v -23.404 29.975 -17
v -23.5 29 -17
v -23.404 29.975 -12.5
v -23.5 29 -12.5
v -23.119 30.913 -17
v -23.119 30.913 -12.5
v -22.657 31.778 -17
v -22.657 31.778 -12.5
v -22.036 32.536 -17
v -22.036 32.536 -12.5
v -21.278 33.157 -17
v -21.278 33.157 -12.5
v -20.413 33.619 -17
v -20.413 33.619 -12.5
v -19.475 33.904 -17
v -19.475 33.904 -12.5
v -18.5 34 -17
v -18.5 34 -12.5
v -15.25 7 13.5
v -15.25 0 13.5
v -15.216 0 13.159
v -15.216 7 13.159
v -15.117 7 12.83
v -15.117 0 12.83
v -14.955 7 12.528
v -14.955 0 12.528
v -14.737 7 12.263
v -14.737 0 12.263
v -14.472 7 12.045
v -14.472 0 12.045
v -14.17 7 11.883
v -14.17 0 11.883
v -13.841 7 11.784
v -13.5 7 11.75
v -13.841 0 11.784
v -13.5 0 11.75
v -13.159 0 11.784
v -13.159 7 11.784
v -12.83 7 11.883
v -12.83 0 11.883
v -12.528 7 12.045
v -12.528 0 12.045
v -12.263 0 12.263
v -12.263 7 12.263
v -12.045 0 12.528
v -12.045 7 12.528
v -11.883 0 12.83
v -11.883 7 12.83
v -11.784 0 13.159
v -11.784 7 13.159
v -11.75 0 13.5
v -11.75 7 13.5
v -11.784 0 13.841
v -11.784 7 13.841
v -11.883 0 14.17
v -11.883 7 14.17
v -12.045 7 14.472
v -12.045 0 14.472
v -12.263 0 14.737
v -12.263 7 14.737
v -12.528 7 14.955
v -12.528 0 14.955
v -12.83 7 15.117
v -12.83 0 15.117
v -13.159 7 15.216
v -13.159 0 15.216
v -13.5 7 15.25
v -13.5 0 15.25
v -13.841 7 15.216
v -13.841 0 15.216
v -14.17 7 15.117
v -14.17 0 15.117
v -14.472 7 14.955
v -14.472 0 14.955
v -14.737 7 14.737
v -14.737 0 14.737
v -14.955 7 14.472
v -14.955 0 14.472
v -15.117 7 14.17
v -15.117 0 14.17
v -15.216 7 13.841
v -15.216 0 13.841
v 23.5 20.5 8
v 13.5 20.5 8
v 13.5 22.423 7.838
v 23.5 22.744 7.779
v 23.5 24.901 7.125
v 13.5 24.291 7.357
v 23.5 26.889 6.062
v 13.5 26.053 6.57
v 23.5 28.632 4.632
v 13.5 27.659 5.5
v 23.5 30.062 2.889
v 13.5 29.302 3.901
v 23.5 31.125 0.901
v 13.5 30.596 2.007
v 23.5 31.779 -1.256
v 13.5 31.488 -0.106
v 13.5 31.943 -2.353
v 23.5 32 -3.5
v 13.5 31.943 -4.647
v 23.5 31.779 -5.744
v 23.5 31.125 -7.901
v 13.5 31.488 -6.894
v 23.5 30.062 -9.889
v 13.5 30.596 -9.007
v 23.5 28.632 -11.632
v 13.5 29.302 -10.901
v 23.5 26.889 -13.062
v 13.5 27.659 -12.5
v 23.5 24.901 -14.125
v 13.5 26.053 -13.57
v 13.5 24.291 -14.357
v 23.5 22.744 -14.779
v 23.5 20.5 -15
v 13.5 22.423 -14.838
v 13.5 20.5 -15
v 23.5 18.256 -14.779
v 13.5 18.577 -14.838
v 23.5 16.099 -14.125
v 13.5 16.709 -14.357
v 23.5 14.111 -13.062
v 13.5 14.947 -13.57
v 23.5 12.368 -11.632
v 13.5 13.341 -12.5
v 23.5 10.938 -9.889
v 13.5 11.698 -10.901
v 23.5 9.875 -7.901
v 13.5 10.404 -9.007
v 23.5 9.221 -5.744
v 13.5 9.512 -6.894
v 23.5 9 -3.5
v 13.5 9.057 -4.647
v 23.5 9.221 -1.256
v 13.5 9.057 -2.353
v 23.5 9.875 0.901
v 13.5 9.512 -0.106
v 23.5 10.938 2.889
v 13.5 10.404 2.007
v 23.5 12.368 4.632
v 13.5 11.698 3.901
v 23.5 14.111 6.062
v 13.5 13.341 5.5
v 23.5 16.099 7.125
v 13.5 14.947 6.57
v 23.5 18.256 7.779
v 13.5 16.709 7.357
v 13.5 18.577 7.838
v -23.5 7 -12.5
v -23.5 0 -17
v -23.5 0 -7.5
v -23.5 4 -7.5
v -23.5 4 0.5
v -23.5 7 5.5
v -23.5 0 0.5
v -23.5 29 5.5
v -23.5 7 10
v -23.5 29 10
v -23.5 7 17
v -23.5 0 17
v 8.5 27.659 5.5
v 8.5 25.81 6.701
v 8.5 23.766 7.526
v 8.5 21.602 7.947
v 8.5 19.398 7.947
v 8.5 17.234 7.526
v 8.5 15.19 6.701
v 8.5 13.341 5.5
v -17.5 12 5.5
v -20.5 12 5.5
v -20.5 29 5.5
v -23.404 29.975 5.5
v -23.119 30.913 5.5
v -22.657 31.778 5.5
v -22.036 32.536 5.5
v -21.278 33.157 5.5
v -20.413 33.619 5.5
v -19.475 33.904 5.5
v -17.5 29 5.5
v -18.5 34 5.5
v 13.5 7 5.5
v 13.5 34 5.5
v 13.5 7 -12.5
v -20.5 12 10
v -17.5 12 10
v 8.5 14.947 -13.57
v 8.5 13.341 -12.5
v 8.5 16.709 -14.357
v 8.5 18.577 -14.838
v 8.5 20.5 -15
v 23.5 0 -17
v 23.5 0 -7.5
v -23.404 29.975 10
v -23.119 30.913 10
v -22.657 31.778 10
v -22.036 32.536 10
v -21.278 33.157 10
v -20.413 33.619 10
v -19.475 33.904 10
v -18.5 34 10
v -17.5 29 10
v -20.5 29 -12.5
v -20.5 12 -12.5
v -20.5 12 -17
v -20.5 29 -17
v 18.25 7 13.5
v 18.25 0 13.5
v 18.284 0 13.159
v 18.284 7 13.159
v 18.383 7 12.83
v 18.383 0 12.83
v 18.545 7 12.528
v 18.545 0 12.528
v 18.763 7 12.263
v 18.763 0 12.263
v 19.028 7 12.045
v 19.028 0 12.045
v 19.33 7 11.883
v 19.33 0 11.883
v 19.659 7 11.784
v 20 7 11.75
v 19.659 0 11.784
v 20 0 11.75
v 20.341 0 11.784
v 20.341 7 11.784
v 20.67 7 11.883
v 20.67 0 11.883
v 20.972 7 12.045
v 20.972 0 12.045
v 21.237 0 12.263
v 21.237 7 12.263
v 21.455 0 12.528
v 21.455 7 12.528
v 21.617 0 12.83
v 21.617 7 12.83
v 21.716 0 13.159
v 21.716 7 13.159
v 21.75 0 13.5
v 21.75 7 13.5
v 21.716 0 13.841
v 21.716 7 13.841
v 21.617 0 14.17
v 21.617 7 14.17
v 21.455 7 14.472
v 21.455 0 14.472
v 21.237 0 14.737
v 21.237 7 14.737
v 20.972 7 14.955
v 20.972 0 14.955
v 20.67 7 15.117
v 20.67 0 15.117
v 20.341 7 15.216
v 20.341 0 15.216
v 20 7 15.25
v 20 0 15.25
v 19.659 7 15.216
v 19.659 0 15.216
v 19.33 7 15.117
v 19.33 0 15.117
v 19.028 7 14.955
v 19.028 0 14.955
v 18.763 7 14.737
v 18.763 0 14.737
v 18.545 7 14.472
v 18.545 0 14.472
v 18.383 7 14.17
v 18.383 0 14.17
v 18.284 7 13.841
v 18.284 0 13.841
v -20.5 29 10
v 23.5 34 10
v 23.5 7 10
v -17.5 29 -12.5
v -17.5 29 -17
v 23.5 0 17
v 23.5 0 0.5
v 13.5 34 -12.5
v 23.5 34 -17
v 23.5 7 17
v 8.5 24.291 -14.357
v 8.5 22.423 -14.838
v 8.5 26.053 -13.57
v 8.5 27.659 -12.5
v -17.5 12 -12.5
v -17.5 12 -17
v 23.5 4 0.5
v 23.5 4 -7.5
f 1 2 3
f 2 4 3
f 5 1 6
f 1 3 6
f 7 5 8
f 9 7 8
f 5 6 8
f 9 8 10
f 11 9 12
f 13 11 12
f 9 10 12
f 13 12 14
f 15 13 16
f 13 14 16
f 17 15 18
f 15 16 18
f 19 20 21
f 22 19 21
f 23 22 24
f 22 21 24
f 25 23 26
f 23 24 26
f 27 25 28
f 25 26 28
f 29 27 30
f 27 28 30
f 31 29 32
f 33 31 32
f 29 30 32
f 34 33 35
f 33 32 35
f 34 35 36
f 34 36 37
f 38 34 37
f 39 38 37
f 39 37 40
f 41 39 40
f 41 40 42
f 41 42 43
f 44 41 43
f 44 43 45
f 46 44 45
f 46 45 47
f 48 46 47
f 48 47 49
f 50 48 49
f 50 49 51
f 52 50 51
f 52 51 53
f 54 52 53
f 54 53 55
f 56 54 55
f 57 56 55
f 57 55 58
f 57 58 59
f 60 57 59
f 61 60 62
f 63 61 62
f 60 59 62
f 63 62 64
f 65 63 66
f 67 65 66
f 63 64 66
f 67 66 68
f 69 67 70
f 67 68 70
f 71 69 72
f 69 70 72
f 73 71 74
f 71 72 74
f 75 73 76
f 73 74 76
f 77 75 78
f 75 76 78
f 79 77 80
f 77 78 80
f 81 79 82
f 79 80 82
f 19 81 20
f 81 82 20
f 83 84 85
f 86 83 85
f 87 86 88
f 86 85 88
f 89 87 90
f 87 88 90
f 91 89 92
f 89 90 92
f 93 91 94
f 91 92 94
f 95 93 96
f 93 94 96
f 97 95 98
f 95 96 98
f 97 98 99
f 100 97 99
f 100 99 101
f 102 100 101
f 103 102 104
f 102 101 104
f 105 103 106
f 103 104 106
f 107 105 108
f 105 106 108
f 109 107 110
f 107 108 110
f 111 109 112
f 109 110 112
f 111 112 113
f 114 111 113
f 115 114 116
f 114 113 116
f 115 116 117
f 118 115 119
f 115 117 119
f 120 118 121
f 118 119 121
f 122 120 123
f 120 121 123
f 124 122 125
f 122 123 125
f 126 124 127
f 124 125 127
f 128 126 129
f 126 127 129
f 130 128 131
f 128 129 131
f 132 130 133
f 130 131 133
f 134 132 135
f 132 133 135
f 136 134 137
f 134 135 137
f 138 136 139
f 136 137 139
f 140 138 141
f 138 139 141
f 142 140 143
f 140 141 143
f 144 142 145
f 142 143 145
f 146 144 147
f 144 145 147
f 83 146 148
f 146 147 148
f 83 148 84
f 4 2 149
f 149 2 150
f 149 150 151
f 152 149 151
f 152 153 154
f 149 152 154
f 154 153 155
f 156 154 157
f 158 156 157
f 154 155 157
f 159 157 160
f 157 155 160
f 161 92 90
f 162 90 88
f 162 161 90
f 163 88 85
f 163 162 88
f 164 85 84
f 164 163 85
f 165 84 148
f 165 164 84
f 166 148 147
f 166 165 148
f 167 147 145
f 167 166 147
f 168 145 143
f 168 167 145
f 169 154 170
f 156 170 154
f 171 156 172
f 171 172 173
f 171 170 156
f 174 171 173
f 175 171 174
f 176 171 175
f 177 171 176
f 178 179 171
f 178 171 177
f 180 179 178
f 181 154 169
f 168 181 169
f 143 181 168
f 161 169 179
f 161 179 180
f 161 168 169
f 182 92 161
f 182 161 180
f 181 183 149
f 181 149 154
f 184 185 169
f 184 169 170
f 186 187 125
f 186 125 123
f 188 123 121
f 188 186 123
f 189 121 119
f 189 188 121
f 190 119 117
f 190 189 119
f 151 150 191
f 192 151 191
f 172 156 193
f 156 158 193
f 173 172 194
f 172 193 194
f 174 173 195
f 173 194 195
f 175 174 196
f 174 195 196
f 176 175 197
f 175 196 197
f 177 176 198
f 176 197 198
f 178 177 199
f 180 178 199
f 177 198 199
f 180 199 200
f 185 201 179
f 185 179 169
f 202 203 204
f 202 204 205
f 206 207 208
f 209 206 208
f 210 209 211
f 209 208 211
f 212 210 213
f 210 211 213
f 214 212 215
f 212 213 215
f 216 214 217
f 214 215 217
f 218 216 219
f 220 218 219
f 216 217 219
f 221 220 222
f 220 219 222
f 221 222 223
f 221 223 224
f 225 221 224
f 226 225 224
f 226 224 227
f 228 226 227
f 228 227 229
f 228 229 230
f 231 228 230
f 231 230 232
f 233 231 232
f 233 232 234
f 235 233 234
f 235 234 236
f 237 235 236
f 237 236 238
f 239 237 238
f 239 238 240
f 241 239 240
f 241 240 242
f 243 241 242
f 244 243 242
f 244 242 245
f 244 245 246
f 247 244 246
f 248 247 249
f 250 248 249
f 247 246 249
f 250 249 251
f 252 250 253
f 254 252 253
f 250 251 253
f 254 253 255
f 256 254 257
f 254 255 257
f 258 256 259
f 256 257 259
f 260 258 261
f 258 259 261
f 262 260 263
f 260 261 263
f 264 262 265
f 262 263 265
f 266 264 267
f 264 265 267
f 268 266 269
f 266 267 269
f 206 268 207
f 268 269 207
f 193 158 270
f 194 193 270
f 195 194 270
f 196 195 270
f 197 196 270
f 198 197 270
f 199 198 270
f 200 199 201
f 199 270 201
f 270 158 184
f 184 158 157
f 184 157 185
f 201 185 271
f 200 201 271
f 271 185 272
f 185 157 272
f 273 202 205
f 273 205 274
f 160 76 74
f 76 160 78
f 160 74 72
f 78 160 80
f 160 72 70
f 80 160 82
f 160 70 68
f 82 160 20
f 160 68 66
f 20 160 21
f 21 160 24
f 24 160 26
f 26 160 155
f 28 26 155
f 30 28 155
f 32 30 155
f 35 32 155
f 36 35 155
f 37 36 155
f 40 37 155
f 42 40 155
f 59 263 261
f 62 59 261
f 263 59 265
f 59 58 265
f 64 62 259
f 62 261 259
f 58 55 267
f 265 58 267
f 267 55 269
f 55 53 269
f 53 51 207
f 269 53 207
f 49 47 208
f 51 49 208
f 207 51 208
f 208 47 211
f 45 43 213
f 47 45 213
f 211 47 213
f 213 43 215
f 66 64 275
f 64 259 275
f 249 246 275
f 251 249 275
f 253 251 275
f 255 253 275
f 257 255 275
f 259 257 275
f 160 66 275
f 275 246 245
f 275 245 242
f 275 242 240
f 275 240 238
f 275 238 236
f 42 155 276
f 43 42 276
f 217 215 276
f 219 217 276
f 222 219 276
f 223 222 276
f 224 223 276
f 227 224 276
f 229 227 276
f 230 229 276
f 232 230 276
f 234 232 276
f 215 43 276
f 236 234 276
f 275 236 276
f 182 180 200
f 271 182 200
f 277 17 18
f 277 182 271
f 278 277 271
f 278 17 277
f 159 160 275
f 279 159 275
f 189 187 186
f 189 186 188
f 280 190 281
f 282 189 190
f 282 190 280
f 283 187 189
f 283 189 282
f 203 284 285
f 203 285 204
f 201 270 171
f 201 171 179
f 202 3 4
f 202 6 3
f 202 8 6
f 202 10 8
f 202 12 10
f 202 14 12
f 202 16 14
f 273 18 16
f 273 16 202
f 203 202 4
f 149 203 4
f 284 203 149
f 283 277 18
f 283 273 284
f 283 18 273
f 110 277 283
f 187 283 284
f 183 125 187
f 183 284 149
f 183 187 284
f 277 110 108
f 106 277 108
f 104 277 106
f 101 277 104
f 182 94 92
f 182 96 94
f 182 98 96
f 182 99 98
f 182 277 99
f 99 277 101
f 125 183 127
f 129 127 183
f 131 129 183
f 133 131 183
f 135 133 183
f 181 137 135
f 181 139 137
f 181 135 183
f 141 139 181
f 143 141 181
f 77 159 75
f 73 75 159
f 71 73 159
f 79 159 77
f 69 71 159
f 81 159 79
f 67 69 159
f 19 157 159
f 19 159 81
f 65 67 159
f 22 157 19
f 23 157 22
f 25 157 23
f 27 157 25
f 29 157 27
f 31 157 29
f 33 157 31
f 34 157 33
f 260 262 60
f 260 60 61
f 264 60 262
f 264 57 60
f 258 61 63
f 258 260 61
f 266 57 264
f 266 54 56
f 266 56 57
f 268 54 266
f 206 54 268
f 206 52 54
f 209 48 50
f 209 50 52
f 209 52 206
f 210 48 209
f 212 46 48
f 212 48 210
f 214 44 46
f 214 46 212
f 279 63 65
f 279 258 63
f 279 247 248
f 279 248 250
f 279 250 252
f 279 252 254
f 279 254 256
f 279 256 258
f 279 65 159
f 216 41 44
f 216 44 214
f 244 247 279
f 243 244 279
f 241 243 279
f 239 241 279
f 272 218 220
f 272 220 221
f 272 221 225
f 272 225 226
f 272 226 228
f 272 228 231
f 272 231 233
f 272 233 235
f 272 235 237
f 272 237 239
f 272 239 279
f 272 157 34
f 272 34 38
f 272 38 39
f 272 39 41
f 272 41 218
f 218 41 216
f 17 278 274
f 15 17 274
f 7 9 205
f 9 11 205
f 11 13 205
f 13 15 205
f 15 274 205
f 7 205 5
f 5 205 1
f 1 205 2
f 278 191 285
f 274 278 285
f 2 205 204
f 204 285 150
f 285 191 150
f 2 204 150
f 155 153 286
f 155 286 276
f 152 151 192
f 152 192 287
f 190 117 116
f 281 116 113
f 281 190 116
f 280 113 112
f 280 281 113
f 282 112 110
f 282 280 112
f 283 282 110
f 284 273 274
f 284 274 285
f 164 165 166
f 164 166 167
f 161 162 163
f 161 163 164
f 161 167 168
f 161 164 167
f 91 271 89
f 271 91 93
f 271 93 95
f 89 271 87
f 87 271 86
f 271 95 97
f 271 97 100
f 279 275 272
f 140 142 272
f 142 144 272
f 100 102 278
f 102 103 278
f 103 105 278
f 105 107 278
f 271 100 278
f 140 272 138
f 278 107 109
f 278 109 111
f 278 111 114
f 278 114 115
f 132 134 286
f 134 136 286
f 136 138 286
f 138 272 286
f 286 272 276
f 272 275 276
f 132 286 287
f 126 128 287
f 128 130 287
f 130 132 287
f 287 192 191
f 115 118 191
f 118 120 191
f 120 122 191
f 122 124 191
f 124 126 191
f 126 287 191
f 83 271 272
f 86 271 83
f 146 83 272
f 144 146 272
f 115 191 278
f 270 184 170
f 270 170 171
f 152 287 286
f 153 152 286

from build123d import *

# Parameters (mm, degrees)
SKETCH_1_W          = 47
SKETCH_1_H          = 34
EXTRUDE_1_DEPTH     = 7
CUT_EXTRUDE_1_DEPTH = 51.46781152378217
HOLE_WIZARD_1_D     = 3.5
EXTRUDE_2_DEPTH     = 27
HOLE_WIZARD_2_D     = 23
HOLE_WIZARD_2_DEPTH = 10
CUT_EXTRUDE_2_DEPTH = 54.04714883949938
CUT_EXTRUDE_START   = -5
SKETCH_11_R         = 11.50000000000001
CUT_EXTRUDE_3_DEPTH = 5
CUT_EXTRUDE_4_DEPTH = 50.36851223198853
FILLET_1_R          = 5


with BuildPart() as part:
    # 草图1 → 凸台-拉伸1 (new body)
    with BuildSketch(Plane(origin=(0, 0, 0), x_dir=(1, 0, 0), z_dir=(0, 1, 0))):
        Rectangle(SKETCH_1_W, SKETCH_1_H)
    extrude(amount=EXTRUDE_1_DEPTH)

    # 草图2 → 切除-拉伸1 (cut, through all)
    with BuildSketch(Plane(origin=(23.500000000000007, 0, 0), x_dir=(0, 0, -1), z_dir=(1, 0, 0))):
        Polygon((-0.4999999999999987, 4), (-0.4999999999999987, 0), (3.5, 0), (7.5, 0), (7.500000000000002, 4), align=None)
    extrude(amount=-CUT_EXTRUDE_1_DEPTH, mode=Mode.SUBTRACT)

    # 孔1 (through all)
    with Locations(Plane(origin=(0, 7, 0), x_dir=(1, 0, 0), z_dir=(0, 1, 0))):
        with Locations((-13.5, -13.5), (20, -13.5)):
            Hole(HOLE_WIZARD_1_D / 2)

    # 草图6 → 凸台-拉伸2 (add)
    with BuildSketch(Plane(origin=(0, 7, 0), x_dir=(1, 0, 0), z_dir=(0, 1, 0))):
        Polygon((-23.499999999999993, -10.000000000000009), (23.500000000000007, -10.000000000000002), (23.500000000000007, 17), (-23.499999999999993, 17), align=None)
    extrude(amount=EXTRUDE_2_DEPTH)

    # 孔2
    with Locations(Plane(origin=(23.500000000000007, 0, 0), x_dir=(0, 0, -1), z_dir=(1, 0, 0))):
        with Locations((3.5, 20.5)):
            Hole(HOLE_WIZARD_2_D / 2, depth=HOLE_WIZARD_2_DEPTH)

    # 草图10 → 切除-拉伸2 (cut, through all)
    with BuildSketch(Plane(origin=(13.500000000000007, 0, 0), x_dir=(0, 0, -1), z_dir=(1, 0, 0))):
        Polygon((-5.5000000000000036, 34.00000000000001), (12.499999999999998, 34.00000000000001), (12.499999999999998, 7.000000000000013), (-5.5, 7.000000000000013), align=None)
    extrude(amount=-CUT_EXTRUDE_2_DEPTH, mode=Mode.SUBTRACT)

    # 草图11 → 切除-拉伸3 (cut)
    with BuildSketch(Plane(origin=(13.500000000000007, 0, 0), x_dir=(0, 0, -1), z_dir=(1, 0, 0)).offset(CUT_EXTRUDE_START)):
        with Locations((3.500000000000003, 20.500000000000004)):
            Circle(SKETCH_11_R)
    extrude(amount=CUT_EXTRUDE_3_DEPTH, mode=Mode.SUBTRACT)

    # 草图12 → 切除-拉伸4 (cut, through all)
    with BuildSketch(Plane.XY.offset(10.000000000000005)):
        Polygon((-20.499999999999993, 29), (-17.499999999999996, 29), (-17.499999999999993, 12), (-20.49999999999999, 12), align=None)
    extrude(amount=-CUT_EXTRUDE_4_DEPTH, mode=Mode.SUBTRACT)

    # 圆角1
    fillet_1_edges = [part.edges().sort_by_distance(p)[0] for p in [
        (-23.499999999999993, 34, -14.75),
        (-23.499999999999993, 34, 7.750000000000007),
    ]]
    fillet(fillet_1_edges, radius=FILLET_1_R)


solid = part.part
